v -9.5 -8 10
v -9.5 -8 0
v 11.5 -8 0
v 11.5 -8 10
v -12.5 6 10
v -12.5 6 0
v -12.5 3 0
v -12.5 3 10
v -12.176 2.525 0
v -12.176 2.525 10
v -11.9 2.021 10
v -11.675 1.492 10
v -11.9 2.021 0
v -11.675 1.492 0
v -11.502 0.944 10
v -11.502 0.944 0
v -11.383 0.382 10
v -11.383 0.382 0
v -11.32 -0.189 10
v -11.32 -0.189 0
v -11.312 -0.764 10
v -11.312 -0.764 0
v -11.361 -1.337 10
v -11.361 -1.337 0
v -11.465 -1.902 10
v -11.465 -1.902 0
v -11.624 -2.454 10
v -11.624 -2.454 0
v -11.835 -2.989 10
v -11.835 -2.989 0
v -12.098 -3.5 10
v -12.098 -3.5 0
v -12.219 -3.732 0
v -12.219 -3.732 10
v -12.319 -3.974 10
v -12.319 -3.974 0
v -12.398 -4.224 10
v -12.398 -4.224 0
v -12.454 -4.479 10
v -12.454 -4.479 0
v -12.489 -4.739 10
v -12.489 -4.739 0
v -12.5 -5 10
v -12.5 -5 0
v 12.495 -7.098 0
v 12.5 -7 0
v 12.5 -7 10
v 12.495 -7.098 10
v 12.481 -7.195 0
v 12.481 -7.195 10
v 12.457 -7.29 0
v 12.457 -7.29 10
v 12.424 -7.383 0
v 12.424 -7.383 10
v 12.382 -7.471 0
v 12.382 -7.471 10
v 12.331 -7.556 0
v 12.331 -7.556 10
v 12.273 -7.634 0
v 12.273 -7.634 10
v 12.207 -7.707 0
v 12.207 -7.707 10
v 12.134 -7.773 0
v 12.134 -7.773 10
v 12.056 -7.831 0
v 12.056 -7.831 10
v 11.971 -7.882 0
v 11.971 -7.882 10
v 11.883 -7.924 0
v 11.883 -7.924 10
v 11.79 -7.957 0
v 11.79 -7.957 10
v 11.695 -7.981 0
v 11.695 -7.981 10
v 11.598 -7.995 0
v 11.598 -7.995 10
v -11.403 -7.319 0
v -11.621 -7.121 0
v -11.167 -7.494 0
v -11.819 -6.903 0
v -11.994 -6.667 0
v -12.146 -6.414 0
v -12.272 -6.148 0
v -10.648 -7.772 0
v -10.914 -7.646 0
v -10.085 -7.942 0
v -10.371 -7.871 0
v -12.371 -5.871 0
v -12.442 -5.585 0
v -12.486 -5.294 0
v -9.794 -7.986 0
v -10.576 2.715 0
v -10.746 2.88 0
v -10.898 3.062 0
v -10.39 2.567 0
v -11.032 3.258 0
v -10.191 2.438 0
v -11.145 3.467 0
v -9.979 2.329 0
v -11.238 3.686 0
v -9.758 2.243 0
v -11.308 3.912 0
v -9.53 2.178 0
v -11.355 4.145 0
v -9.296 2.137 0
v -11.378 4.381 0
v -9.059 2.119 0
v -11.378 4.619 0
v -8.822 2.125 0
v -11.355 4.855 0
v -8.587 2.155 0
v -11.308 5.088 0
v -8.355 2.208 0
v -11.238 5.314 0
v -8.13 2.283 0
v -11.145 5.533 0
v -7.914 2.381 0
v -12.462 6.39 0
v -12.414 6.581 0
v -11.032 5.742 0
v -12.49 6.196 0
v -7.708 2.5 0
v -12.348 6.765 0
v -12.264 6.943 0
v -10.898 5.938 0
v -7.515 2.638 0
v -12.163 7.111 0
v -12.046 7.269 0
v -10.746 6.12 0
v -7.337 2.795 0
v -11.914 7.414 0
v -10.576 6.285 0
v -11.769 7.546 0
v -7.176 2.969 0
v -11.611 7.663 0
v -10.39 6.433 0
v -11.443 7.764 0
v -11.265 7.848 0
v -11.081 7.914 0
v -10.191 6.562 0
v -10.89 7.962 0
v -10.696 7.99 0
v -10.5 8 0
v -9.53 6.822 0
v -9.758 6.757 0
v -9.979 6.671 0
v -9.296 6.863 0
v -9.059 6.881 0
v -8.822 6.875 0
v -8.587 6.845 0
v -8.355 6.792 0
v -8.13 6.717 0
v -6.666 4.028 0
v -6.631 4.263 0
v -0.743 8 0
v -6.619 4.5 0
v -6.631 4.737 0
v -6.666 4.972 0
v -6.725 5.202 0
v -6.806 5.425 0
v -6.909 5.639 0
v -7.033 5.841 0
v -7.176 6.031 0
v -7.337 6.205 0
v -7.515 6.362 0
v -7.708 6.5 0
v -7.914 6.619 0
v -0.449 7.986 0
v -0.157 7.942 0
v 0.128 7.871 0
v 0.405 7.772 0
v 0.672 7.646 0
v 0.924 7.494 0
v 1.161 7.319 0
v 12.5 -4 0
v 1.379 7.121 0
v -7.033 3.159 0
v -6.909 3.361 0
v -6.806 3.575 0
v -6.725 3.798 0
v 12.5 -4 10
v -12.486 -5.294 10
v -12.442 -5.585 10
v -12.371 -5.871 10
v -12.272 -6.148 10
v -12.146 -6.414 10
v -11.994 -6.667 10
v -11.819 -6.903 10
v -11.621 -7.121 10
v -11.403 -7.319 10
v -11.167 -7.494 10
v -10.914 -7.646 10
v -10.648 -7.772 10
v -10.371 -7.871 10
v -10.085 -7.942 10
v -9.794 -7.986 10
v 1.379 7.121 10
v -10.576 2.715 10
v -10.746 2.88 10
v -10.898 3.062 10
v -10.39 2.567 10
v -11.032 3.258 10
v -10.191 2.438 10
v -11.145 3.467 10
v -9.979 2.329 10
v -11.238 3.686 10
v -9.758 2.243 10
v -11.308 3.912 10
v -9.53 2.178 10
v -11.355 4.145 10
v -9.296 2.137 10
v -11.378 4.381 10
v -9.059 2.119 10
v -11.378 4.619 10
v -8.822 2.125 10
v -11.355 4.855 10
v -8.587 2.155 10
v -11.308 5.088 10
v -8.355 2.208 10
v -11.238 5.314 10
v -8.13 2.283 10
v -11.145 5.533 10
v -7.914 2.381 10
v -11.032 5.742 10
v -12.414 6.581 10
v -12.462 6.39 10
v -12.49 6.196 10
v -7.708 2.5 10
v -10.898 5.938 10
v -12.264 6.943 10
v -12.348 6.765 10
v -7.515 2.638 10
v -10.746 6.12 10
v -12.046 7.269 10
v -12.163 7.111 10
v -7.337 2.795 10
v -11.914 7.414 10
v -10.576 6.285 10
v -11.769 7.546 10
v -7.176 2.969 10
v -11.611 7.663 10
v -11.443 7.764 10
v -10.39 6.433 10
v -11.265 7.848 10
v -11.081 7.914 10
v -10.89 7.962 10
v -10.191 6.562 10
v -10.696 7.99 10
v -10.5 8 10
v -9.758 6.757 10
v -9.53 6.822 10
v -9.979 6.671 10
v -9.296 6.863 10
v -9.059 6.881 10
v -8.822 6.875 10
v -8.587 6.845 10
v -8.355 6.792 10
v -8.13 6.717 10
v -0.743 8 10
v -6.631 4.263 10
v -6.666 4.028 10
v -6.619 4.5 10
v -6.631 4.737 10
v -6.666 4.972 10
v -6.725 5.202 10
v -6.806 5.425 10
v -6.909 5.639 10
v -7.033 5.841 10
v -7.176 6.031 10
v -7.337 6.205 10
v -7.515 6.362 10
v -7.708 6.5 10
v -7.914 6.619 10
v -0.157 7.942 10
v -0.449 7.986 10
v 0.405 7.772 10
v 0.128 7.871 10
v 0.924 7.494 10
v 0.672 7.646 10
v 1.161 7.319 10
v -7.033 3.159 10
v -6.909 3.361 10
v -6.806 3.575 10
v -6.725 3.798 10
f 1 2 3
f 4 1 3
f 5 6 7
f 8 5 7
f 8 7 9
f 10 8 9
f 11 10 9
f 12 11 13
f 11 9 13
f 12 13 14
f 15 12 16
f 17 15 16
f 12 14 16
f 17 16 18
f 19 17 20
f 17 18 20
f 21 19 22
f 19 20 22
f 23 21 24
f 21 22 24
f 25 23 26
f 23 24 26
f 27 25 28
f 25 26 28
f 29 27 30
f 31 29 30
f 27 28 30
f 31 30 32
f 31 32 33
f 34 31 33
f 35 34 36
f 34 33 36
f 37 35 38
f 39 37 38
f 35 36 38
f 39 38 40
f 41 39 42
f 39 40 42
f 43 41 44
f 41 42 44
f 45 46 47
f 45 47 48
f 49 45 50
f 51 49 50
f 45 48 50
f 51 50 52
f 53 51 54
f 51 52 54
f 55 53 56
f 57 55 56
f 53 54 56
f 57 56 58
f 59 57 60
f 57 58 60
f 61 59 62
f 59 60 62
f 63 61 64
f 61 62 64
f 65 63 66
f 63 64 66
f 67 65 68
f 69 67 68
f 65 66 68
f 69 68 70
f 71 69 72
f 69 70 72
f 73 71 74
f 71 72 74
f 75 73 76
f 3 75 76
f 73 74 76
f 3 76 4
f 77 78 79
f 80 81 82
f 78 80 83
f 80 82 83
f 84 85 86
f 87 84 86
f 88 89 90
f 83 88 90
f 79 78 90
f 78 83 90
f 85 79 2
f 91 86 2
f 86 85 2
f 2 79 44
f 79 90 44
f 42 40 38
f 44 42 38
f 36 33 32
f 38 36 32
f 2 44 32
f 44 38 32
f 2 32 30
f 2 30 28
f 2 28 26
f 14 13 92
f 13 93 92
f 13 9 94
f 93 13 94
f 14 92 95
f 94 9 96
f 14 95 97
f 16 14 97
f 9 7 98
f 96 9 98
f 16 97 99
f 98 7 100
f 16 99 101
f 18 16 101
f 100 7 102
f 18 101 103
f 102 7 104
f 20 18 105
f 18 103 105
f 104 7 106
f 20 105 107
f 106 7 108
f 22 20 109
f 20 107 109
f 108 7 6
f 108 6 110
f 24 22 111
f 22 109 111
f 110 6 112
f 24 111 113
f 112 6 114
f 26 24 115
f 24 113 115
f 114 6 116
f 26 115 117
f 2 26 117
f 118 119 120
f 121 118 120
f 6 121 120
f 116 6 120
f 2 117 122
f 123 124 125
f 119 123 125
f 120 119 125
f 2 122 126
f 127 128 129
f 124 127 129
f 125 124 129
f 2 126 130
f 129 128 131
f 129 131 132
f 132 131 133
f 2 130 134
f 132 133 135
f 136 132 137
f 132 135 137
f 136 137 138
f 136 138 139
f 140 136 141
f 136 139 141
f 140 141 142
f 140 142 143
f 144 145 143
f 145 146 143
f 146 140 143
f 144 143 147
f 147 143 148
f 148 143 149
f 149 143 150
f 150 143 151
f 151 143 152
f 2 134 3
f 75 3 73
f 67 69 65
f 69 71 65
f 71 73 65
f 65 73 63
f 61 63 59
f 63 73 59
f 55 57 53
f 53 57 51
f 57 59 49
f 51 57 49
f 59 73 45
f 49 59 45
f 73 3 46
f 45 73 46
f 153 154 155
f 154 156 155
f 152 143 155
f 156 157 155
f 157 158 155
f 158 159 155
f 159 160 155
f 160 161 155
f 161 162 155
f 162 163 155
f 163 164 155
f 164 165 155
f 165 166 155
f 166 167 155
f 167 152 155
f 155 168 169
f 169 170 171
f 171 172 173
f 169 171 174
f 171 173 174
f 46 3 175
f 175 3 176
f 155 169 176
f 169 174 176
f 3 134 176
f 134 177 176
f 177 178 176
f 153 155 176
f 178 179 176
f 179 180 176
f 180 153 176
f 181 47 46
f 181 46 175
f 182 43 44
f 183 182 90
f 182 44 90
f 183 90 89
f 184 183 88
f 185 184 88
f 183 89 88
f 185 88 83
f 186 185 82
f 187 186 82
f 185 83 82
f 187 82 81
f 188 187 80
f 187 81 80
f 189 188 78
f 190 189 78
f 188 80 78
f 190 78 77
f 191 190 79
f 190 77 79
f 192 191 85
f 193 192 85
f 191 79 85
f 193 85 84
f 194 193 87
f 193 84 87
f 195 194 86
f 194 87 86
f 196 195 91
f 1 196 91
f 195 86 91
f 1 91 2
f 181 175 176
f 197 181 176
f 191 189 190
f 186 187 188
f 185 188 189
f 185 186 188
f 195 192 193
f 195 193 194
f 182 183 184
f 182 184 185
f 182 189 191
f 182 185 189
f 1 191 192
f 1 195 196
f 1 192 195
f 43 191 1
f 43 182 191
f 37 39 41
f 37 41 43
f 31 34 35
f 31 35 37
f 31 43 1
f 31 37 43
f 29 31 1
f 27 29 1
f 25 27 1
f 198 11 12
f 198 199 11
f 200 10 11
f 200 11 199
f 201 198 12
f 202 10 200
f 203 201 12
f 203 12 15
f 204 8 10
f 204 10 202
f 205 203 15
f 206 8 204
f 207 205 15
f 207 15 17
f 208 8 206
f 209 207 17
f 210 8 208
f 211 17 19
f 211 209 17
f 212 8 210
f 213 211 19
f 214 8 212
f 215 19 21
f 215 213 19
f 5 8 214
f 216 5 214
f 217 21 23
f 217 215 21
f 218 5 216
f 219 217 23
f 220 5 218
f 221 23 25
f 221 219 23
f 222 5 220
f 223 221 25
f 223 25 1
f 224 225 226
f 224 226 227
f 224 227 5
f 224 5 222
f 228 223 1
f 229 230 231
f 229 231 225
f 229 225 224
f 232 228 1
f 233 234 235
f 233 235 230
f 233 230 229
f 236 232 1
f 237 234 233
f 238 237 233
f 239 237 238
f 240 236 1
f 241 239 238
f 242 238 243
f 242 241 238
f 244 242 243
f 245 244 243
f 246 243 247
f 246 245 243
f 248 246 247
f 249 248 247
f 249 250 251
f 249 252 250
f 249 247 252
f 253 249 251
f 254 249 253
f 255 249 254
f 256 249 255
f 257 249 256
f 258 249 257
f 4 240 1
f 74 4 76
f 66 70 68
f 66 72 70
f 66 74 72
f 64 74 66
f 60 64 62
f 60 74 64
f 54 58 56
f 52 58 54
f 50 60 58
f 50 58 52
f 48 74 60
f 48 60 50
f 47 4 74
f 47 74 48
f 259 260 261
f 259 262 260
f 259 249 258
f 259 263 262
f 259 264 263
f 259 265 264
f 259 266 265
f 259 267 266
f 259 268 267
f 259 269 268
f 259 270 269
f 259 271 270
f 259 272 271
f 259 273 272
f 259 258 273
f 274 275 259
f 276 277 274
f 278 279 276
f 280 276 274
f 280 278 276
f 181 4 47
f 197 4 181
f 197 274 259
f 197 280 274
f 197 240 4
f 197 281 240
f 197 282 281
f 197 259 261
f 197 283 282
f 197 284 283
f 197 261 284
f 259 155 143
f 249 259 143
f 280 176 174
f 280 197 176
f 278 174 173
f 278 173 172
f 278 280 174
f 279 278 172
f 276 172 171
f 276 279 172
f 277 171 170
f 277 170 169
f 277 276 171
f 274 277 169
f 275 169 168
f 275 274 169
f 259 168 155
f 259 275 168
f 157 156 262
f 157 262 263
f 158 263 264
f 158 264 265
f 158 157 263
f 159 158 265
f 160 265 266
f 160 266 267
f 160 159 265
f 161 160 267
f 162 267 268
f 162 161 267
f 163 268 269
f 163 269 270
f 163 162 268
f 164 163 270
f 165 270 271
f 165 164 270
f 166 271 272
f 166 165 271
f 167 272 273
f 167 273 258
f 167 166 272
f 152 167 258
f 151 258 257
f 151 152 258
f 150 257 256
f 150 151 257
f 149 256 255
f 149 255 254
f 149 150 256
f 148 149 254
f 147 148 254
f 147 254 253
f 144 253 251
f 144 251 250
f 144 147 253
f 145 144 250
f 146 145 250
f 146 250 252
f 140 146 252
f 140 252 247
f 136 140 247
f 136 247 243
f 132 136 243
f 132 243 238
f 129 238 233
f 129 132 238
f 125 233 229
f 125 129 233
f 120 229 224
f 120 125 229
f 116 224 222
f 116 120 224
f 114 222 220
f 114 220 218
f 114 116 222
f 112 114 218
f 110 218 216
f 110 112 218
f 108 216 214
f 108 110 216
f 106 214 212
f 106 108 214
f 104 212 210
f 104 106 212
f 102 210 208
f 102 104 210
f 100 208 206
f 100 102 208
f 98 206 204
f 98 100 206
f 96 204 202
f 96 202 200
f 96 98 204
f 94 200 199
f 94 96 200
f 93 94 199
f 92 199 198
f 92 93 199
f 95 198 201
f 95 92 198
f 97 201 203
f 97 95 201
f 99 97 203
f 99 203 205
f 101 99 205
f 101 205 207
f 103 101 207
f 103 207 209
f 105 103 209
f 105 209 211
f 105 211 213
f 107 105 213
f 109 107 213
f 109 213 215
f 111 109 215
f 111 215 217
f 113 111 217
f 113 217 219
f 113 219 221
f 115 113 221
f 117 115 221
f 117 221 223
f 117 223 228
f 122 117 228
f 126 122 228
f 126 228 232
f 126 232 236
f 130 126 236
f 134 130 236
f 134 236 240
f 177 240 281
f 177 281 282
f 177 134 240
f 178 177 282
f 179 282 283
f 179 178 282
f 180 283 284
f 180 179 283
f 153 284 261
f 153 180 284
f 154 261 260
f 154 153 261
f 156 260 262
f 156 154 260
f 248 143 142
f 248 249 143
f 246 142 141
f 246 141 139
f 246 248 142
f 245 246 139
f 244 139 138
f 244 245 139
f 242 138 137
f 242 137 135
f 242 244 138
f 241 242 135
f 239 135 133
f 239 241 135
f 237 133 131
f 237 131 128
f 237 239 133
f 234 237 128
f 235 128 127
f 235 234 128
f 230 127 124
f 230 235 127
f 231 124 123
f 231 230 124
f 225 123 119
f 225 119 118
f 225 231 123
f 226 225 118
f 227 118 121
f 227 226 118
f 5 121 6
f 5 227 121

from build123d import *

# Parameters (mm, degrees)
SKETCH1_R           = 2.38125
BOSS_EXTRUDE1_DEPTH = 10
FILLET5_R           = 3
FILLET6_R           = 1
FILLET7_R           = 2


with BuildPart() as part:
    # Sketch1 → Boss-Extrude1 (new body)
    with BuildSketch(Plane.XY):
        with BuildLine():
            Line((12.5, -4), (0.5, 8))
            Line((0.5, 8), (-12.5, 8))
            Line((-12.5, 8), (-12.5, 3))
            ThreePointArc((-12.5, 3), (-11.31971292, -0.189443986), (-12.098076211, -3.5))
            ThreePointArc((-12.098076211, -3.5), (-12.397777479, -4.223542865), (-12.5, -5))
            ThreePointArc((-12.5, -5), (-11.621320344, -7.121320344), (-9.5, -8))
            Line((-9.5, -8), (12.5, -8))
            Line((12.5, -8), (12.5, -4))
        make_face()
        with Locations((-9, 4.5)):
            Circle(SKETCH1_R, mode=Mode.SUBTRACT)
    extrude(amount=BOSS_EXTRUDE1_DEPTH)

    # Fillet5
    fillet5_edges = [part.edges().sort_by_distance(p)[0] for p in [
        (0.5, 8, 5),
    ]]
    fillet(fillet5_edges, radius=FILLET5_R)

    # Fillet6
    fillet6_edges = [part.edges().sort_by_distance(p)[0] for p in [
        (12.5, -8, 5),
    ]]
    fillet(fillet6_edges, radius=FILLET6_R)

    # Fillet7
    fillet7_edges = [part.edges().sort_by_distance(p)[0] for p in [
        (-12.5, 8, 5),
    ]]
    fillet(fillet7_edges, radius=FILLET7_R)


solid = part.part
